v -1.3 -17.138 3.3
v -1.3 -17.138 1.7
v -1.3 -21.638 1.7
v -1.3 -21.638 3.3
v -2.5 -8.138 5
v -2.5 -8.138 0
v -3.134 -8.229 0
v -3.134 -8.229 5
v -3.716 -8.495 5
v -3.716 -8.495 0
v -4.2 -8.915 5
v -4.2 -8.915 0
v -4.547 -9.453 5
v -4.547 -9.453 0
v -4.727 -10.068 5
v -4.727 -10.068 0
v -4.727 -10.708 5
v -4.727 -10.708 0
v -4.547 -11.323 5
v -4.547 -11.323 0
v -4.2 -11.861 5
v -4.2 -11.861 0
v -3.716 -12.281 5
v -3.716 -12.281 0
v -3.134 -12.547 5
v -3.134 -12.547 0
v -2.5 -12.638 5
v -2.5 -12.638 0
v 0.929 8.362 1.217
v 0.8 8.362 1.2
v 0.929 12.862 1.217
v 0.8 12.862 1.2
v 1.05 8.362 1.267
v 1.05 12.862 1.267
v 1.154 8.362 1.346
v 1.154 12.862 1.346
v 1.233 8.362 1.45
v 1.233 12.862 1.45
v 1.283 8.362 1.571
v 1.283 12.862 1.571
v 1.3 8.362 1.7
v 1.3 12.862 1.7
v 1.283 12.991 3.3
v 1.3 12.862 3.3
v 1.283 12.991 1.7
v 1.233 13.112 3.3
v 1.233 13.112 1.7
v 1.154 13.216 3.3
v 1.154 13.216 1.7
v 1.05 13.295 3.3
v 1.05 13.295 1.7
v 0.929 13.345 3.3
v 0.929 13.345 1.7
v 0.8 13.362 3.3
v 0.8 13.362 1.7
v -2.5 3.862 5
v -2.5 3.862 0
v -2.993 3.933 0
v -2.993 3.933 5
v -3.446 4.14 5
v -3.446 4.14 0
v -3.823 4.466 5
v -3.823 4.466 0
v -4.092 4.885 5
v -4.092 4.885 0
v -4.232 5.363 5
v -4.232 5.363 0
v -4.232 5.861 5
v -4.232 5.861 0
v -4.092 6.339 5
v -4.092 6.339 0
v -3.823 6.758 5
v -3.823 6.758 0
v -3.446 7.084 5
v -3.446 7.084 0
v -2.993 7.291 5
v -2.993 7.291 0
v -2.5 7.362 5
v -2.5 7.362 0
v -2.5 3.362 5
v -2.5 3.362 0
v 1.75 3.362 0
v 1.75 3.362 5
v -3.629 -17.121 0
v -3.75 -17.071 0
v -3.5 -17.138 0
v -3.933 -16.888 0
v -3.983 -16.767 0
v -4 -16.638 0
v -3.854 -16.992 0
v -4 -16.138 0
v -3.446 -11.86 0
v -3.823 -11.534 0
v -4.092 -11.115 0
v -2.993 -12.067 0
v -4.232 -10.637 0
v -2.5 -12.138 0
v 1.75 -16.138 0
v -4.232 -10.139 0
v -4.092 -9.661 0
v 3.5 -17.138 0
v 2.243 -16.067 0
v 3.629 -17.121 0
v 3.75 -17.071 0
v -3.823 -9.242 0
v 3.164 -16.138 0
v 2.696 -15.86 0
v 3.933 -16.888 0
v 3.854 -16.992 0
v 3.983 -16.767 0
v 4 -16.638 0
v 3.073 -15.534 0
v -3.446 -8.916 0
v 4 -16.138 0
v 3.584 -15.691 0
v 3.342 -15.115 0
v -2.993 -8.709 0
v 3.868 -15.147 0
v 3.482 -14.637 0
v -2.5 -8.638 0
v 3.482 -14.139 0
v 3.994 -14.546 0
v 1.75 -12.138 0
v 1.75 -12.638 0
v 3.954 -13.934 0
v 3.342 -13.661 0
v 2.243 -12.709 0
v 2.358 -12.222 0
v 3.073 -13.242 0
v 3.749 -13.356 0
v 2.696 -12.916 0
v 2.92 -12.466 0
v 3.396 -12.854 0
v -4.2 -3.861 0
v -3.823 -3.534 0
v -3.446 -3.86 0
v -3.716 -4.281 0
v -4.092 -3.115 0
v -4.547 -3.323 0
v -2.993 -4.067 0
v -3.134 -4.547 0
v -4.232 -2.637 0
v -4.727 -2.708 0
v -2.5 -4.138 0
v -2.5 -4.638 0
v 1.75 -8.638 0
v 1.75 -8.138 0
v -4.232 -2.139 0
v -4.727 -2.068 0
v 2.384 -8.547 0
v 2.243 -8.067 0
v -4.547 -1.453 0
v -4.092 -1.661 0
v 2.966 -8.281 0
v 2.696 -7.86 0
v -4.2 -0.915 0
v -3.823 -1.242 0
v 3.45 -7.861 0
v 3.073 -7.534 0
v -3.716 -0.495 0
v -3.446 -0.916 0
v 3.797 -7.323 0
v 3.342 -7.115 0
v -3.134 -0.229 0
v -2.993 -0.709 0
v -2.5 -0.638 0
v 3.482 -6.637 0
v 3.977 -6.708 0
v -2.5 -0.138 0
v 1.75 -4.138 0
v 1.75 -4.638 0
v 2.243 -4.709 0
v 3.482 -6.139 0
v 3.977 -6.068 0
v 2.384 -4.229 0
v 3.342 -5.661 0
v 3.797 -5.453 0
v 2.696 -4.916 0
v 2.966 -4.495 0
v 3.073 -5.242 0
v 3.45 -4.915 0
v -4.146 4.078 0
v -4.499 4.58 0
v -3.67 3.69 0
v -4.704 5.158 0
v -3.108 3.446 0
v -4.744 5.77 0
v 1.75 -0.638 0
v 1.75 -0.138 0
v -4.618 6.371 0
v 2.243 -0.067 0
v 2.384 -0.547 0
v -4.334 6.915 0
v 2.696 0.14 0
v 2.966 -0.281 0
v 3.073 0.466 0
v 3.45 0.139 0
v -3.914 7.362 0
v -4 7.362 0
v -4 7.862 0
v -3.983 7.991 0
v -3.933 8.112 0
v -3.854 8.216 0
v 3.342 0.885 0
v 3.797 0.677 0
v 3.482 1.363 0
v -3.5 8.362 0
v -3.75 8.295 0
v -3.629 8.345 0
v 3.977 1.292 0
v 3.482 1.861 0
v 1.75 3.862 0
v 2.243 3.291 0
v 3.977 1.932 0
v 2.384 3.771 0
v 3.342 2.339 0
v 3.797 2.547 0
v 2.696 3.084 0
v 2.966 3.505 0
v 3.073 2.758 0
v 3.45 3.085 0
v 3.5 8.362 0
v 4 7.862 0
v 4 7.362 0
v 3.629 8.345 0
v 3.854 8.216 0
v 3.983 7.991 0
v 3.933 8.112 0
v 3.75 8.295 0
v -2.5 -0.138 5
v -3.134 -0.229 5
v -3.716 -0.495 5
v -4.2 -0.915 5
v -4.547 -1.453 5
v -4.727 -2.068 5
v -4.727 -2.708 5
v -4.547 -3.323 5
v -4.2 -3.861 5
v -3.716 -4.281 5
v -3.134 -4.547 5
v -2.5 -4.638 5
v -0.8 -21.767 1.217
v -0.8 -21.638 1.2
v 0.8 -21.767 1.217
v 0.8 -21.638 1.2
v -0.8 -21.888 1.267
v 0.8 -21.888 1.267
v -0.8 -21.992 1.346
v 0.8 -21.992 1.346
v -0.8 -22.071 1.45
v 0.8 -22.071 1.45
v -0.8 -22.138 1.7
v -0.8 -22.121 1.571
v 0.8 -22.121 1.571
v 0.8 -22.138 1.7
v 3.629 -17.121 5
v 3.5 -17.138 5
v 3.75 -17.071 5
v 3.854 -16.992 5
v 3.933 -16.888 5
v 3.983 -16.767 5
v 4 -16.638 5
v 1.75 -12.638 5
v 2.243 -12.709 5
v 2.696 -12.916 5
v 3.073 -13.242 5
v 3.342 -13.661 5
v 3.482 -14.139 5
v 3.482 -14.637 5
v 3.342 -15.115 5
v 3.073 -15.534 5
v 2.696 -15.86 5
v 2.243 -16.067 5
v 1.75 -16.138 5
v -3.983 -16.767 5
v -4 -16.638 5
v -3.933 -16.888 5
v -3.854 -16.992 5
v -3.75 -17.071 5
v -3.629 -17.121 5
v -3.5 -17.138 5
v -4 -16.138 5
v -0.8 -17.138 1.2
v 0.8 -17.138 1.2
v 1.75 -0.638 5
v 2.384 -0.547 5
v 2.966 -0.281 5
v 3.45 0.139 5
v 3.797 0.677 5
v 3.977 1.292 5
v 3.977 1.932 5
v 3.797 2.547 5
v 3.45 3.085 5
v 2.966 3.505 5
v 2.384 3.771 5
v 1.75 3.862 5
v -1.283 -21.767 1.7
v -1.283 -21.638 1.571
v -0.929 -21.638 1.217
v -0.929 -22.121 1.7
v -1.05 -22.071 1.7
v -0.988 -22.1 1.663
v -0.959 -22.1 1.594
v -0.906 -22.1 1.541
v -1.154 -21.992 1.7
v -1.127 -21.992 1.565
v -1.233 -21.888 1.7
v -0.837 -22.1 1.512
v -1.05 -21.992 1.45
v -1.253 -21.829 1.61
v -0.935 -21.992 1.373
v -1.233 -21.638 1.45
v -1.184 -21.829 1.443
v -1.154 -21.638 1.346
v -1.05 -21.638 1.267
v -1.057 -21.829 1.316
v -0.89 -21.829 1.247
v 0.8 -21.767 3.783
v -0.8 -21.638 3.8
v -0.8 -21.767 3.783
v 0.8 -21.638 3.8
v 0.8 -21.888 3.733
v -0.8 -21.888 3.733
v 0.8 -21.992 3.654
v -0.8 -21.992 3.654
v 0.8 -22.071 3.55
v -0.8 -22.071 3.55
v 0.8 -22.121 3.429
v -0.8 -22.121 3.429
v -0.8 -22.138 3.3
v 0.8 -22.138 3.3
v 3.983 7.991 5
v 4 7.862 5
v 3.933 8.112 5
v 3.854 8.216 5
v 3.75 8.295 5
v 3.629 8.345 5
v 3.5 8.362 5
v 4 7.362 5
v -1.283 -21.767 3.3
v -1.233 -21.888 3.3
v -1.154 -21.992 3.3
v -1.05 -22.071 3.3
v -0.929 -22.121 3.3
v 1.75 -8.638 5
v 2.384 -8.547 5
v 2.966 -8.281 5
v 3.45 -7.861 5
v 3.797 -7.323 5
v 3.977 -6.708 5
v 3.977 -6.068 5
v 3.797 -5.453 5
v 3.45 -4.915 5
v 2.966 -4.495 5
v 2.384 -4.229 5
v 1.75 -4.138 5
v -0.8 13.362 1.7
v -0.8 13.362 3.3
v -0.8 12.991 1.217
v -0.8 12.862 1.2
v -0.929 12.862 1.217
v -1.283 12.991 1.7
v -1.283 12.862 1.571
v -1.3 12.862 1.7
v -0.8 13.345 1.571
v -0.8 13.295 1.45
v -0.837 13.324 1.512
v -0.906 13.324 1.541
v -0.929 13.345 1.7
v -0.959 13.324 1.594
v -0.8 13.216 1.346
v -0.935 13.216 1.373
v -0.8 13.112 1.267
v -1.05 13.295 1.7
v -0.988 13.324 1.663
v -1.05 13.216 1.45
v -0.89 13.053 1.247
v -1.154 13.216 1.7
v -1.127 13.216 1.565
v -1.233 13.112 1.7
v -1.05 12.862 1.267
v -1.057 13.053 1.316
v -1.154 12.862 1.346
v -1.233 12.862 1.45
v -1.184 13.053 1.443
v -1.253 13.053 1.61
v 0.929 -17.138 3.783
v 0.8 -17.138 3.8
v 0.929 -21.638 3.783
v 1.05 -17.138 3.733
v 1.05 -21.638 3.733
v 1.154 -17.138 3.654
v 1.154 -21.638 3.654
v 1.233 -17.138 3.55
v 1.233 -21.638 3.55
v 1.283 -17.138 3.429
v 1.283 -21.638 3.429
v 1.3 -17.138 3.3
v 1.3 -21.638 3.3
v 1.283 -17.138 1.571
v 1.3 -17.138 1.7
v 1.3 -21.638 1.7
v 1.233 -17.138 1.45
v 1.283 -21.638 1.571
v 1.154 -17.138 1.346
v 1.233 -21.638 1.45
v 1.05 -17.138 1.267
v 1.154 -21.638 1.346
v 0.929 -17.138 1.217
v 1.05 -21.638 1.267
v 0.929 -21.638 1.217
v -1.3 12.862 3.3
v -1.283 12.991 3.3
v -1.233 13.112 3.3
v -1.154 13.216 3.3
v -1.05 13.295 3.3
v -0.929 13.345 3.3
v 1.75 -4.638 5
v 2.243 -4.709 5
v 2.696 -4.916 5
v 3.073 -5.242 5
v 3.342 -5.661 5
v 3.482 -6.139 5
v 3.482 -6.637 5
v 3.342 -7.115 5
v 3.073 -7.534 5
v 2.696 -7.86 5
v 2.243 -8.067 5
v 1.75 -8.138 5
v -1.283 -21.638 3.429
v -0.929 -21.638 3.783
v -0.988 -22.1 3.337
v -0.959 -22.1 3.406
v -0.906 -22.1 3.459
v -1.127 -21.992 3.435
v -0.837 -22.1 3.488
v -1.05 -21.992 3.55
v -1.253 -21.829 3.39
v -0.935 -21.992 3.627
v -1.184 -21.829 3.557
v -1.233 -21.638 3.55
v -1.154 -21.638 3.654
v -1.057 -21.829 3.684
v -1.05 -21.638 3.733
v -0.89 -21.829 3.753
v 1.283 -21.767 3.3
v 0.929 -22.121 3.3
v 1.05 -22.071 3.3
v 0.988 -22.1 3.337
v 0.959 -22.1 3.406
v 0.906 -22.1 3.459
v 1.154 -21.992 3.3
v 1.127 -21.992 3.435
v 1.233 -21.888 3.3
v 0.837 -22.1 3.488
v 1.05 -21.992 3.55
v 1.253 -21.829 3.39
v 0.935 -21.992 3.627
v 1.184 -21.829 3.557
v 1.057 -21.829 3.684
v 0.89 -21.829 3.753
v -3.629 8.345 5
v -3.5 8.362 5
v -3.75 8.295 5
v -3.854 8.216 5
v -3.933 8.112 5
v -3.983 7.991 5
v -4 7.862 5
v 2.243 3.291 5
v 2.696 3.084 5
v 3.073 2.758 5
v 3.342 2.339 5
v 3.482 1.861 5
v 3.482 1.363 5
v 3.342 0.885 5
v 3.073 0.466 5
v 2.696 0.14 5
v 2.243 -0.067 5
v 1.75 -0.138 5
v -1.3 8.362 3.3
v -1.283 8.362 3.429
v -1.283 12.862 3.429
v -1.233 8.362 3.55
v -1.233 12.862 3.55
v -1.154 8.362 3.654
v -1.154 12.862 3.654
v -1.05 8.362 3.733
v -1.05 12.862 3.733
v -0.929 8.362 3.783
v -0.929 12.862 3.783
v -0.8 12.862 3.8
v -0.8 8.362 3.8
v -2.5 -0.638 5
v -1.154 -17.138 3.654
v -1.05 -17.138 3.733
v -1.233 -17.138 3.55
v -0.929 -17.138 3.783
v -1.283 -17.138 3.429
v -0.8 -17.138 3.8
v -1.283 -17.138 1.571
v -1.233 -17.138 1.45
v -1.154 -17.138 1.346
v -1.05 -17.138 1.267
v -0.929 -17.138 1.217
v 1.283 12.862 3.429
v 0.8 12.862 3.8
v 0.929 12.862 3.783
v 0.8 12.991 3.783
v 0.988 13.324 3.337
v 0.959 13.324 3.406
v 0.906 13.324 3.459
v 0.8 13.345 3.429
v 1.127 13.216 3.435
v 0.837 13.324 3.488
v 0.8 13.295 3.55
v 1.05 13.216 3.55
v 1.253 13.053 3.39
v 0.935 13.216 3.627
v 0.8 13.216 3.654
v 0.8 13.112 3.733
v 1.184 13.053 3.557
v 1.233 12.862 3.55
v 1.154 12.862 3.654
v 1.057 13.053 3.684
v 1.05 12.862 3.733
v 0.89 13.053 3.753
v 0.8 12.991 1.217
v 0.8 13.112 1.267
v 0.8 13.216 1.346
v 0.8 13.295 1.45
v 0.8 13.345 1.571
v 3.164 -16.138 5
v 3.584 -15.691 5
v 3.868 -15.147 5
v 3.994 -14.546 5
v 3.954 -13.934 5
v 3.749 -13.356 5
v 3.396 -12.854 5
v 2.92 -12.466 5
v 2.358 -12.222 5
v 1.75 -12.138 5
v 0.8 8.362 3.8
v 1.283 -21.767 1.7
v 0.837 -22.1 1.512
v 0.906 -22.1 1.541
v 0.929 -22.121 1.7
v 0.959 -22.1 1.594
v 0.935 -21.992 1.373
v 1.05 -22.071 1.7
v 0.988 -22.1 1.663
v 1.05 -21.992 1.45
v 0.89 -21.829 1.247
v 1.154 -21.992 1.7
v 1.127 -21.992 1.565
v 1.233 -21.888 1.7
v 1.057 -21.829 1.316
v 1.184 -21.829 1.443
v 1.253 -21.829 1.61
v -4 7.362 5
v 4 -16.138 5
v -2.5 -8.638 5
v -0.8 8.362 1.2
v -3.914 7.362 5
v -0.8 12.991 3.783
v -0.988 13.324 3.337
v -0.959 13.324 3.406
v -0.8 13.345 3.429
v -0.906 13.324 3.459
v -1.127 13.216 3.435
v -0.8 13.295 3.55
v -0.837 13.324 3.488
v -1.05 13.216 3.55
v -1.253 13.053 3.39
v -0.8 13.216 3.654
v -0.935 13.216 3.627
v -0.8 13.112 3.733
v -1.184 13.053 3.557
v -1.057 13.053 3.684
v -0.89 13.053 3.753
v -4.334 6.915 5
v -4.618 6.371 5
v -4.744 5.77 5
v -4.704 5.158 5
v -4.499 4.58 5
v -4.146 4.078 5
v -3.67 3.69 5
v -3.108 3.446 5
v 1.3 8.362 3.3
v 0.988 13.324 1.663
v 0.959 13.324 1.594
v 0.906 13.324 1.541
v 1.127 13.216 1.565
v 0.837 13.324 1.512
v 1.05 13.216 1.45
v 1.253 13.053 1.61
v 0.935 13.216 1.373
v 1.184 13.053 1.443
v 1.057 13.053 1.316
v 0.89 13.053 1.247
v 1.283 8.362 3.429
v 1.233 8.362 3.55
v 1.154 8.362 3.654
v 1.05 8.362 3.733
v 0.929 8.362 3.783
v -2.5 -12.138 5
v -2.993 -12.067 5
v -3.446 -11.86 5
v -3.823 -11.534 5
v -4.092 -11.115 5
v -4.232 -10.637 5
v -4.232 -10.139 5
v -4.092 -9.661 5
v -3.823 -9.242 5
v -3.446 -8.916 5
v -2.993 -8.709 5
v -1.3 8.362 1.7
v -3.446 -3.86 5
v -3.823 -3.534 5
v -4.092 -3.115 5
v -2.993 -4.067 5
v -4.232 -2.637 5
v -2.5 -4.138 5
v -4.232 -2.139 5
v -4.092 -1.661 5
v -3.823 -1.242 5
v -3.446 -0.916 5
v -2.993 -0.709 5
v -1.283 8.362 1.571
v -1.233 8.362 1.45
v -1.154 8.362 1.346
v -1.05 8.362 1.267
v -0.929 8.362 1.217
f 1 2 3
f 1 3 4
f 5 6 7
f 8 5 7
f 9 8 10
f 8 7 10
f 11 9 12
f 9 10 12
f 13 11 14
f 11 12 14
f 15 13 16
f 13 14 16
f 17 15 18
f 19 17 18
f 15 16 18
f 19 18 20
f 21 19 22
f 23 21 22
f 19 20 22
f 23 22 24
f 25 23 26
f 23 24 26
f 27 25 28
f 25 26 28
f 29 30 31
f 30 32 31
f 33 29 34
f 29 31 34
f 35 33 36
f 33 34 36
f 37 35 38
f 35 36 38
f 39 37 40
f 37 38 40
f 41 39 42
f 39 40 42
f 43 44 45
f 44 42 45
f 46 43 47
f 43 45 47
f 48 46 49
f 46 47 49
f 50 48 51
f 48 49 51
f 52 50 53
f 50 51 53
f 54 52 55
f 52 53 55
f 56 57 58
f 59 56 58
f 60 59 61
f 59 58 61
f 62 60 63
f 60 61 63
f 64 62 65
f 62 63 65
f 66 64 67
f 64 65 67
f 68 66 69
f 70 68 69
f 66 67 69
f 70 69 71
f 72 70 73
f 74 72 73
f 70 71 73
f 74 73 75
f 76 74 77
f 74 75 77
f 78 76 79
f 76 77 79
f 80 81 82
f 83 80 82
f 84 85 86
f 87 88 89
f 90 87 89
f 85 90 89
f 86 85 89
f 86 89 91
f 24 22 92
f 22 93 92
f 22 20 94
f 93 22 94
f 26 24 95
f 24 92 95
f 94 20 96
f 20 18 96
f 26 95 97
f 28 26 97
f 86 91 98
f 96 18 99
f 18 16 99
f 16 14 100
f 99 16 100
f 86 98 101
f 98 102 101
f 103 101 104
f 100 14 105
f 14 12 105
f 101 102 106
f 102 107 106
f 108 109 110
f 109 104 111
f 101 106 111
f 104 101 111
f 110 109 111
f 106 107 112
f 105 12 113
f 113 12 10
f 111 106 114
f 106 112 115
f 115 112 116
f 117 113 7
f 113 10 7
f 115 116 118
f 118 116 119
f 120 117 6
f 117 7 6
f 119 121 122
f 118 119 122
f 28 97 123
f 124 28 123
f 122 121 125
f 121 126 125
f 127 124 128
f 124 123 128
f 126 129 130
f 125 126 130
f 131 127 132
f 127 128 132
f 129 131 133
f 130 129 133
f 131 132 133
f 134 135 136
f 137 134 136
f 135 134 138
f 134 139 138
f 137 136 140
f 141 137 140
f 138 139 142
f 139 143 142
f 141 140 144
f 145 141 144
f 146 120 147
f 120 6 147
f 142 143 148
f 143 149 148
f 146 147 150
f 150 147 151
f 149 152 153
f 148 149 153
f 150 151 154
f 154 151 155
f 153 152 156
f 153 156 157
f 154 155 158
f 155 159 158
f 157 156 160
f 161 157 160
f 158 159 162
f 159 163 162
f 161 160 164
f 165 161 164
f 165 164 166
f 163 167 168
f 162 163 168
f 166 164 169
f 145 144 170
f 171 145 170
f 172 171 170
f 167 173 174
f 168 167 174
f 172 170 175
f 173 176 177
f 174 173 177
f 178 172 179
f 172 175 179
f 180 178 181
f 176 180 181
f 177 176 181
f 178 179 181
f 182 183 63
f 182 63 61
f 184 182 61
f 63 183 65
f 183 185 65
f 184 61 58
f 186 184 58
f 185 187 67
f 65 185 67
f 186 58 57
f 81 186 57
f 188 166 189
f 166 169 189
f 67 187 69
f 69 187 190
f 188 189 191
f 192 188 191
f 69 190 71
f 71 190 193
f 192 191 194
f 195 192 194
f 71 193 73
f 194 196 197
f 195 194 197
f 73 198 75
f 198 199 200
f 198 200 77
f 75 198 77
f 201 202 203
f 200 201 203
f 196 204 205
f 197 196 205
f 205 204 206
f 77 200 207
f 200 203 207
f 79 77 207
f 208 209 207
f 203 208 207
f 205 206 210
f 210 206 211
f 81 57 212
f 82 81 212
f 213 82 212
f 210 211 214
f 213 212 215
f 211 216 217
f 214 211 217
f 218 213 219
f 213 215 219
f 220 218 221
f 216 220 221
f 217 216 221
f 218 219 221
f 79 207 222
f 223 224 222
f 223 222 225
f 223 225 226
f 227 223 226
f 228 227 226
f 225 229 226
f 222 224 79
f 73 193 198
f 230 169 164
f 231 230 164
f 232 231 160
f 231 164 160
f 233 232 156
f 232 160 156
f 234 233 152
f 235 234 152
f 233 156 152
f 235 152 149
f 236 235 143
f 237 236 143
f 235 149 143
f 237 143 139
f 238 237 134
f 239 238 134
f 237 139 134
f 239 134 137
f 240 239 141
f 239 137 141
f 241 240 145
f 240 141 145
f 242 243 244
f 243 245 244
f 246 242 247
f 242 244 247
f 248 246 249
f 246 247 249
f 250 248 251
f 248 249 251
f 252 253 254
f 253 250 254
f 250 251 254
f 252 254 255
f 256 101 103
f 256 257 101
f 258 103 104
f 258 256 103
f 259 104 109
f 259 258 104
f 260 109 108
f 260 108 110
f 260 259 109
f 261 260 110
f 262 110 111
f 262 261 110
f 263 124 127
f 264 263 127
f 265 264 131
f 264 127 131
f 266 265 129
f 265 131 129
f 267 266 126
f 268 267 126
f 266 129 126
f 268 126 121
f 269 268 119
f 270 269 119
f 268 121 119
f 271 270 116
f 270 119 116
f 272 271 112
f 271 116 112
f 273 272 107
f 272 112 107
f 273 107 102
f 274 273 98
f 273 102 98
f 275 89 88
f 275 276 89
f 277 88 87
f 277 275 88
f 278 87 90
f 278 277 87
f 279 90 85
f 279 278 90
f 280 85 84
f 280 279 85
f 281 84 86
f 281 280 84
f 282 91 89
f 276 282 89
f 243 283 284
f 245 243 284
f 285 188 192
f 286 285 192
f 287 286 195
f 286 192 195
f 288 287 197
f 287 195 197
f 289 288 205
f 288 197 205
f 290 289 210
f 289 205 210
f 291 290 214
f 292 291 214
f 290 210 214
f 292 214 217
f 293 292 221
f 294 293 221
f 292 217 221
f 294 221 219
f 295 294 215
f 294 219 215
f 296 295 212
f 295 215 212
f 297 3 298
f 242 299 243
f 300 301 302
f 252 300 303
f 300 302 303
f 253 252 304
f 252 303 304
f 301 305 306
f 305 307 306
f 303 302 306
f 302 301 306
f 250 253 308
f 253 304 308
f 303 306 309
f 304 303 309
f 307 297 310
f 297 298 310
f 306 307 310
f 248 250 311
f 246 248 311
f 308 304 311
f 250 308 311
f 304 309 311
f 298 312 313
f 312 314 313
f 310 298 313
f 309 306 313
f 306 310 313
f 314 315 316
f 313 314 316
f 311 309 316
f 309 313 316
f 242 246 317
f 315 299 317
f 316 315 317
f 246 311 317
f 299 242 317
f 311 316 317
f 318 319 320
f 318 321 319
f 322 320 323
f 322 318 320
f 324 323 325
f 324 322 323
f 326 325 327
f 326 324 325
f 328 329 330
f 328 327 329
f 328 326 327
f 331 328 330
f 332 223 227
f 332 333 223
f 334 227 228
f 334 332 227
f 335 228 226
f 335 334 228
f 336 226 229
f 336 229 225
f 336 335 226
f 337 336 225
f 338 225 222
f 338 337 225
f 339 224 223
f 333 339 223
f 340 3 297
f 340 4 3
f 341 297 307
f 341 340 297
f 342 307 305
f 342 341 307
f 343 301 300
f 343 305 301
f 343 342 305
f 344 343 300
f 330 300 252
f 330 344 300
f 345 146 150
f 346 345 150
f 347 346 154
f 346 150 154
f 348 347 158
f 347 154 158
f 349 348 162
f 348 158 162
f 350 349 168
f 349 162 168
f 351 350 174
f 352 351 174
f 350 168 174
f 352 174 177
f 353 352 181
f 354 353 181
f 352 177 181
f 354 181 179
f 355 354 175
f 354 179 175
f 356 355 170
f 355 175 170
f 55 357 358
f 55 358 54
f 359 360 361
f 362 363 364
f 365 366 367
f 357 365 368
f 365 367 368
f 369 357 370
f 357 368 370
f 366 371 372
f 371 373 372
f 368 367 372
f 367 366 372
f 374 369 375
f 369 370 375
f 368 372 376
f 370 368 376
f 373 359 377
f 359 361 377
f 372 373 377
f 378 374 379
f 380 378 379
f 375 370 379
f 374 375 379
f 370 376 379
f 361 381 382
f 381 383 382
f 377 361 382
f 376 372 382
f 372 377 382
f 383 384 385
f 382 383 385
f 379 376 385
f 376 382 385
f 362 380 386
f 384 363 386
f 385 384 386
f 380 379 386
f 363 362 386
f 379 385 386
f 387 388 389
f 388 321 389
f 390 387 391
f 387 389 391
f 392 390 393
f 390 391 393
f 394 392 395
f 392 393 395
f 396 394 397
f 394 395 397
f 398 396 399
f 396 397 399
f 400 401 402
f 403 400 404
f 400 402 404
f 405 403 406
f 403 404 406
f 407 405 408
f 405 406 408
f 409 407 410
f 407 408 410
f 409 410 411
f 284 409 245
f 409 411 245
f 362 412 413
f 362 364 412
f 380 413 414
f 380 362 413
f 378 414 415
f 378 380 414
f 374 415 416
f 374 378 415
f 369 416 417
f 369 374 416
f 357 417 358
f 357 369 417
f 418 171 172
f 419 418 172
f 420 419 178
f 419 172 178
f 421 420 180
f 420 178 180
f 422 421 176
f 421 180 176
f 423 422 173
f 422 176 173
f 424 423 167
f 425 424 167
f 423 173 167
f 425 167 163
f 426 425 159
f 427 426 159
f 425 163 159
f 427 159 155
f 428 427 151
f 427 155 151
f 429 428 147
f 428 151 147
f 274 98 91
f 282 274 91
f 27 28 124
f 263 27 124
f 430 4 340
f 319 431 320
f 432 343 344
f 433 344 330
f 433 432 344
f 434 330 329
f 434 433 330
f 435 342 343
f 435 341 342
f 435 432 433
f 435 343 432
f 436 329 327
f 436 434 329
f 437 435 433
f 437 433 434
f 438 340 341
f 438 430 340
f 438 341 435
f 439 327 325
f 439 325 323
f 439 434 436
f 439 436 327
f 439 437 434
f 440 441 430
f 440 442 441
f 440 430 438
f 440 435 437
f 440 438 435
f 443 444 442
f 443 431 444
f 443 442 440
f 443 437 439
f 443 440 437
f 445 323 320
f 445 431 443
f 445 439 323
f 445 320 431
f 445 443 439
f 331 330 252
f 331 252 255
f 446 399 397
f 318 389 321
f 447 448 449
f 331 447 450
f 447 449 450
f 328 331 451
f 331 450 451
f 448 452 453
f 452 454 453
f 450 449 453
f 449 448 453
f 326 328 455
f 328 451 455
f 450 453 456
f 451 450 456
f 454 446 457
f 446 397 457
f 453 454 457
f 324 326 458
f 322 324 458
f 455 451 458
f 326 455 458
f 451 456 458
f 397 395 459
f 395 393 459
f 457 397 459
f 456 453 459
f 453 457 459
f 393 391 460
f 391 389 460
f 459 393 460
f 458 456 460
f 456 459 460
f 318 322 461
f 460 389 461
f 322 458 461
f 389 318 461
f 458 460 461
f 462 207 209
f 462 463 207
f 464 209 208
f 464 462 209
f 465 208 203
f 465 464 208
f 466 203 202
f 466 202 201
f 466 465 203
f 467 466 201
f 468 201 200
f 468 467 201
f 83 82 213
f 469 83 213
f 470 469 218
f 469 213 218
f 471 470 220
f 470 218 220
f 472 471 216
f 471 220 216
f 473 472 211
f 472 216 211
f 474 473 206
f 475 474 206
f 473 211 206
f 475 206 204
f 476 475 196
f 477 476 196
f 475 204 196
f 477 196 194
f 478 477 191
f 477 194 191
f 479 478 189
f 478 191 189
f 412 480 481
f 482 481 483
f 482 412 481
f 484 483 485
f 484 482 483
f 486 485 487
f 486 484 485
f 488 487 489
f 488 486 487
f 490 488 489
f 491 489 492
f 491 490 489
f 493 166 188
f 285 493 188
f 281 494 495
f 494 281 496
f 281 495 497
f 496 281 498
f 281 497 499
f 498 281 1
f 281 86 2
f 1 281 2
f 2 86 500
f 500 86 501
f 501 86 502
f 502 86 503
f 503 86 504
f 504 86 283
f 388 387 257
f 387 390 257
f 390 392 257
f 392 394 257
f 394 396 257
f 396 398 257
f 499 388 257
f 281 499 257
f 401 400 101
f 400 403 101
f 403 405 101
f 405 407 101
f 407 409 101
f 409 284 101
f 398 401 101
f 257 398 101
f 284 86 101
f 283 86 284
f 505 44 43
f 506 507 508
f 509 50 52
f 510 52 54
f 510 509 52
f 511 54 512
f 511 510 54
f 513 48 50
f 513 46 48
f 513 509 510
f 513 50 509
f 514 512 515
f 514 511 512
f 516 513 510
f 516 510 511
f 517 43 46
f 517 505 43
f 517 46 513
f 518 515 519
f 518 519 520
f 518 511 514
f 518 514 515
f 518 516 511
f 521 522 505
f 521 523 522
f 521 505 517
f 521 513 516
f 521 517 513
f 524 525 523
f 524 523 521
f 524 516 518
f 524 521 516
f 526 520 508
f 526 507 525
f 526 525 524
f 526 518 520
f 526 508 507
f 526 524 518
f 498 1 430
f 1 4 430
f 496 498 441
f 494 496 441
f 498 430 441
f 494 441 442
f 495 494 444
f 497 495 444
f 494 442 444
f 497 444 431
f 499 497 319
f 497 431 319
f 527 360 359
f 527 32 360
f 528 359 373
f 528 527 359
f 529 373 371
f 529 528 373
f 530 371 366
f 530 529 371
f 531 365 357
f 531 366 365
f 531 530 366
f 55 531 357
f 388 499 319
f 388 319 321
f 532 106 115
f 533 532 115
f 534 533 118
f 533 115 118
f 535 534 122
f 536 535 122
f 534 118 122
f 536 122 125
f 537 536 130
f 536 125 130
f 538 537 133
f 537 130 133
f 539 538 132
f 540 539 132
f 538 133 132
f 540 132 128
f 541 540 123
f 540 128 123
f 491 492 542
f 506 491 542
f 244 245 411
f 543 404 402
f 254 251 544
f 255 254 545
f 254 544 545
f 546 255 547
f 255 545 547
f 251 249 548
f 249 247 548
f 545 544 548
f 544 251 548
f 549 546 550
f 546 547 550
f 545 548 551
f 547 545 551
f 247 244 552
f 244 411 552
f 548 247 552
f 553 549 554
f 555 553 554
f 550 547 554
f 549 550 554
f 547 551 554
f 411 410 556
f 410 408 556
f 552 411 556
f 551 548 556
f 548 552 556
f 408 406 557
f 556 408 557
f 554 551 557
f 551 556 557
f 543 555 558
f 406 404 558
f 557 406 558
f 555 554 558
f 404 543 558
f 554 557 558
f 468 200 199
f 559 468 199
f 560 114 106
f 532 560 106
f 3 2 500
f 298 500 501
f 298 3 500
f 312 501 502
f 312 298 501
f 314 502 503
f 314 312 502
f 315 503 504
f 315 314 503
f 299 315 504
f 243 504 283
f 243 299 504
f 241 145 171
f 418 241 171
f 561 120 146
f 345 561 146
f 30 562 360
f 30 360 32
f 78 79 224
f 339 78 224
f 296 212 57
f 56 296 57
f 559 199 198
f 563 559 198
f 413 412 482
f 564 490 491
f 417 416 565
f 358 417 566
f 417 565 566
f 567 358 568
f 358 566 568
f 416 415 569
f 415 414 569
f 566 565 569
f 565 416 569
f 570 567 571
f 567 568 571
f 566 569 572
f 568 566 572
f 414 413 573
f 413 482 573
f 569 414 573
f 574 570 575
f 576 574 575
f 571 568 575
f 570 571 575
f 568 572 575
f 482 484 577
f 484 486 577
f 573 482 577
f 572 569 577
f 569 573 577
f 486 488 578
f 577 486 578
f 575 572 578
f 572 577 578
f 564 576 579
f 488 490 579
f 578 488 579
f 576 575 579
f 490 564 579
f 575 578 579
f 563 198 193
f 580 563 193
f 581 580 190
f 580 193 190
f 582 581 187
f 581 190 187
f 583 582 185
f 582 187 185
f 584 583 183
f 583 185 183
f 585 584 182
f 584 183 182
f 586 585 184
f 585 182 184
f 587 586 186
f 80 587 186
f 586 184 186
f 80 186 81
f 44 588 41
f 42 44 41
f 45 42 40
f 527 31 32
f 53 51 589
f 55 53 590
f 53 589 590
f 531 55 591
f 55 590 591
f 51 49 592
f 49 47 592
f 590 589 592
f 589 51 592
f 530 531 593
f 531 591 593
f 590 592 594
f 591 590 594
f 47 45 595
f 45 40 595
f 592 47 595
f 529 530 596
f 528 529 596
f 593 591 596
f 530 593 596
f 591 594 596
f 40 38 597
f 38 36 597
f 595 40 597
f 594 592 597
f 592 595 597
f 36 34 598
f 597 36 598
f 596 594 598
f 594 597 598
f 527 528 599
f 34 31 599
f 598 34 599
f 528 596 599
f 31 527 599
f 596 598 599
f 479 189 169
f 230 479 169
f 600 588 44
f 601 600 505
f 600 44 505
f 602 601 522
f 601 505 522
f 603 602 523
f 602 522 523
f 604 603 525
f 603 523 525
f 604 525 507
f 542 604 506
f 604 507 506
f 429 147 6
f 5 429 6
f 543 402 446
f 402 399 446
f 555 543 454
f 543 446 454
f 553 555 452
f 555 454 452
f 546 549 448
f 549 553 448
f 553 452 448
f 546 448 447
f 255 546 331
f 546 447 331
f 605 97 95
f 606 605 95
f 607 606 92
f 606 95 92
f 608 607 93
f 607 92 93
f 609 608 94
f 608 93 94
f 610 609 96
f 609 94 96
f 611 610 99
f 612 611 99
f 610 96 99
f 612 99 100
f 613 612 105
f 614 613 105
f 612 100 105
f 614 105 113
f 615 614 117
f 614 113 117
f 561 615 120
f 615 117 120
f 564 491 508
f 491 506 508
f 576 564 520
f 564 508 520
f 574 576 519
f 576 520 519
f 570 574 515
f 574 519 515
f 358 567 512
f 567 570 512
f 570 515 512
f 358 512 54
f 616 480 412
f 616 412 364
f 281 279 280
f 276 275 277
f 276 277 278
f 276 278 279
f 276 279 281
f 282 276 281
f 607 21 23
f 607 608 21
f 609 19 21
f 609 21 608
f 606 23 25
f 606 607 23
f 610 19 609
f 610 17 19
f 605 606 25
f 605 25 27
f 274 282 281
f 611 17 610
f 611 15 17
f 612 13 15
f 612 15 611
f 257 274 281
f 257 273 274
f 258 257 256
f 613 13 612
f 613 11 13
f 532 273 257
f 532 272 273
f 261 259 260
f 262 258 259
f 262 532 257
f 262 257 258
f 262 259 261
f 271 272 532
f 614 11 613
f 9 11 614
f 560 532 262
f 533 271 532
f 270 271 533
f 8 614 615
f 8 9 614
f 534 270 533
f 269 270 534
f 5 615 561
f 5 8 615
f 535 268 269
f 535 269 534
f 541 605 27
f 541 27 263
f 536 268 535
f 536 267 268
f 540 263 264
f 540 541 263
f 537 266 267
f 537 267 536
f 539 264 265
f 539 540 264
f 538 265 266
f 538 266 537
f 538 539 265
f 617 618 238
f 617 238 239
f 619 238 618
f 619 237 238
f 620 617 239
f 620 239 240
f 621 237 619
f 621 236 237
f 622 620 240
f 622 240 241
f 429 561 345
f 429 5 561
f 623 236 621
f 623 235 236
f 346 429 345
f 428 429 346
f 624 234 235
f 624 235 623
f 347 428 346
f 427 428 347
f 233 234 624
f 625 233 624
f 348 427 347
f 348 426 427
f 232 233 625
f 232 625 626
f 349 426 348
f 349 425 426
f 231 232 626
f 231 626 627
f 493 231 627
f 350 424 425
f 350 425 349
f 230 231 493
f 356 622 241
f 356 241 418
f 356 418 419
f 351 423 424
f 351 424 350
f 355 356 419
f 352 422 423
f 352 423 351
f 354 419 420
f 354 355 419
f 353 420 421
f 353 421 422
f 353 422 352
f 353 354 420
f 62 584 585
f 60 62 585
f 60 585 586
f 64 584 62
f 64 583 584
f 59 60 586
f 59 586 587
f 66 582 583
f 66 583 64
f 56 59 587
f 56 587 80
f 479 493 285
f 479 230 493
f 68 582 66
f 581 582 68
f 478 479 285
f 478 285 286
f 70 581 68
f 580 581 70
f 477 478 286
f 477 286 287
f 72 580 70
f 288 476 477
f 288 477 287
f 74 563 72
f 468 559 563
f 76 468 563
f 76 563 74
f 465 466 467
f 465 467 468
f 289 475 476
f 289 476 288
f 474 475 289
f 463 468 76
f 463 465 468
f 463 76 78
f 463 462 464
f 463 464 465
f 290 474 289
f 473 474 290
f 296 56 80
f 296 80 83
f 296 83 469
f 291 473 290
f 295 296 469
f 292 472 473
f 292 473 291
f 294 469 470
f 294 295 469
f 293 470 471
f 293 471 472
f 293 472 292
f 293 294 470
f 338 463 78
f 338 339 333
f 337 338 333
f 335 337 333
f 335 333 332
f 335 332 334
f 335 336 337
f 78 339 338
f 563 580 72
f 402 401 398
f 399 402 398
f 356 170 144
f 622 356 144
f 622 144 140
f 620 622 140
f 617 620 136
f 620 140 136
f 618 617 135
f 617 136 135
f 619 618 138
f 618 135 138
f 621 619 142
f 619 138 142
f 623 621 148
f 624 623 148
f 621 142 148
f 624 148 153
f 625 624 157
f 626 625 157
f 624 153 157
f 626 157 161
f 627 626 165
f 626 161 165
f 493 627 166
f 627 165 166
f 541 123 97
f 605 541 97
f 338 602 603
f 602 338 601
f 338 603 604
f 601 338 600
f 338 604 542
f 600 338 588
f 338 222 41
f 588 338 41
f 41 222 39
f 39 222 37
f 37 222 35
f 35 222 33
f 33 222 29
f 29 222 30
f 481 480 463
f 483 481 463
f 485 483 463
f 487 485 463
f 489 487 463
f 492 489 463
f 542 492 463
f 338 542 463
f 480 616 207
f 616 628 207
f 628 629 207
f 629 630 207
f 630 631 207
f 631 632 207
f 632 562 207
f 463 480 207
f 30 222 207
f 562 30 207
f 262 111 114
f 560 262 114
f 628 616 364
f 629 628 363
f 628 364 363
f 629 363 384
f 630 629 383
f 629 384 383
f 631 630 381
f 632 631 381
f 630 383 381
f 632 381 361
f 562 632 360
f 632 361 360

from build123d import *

# Parameters (mm, degrees)
BOSS_EXTRUDE1_DEPTH = 5
SKETCH3_W           = 2.6
SKETCH3_H           = 2.6
BOSS_EXTRUDE2_DEPTH = 5
SKETCH4_W           = 2.6
SKETCH4_H           = 2.6
BOSS_EXTRUDE3_DEPTH = 5
FILLET1_R           = 0.5


with BuildPart() as part:
    # Sketch2 → Boss-Extrude1 (new body)
    with BuildSketch(Plane.XY):
        with BuildLine():
            Line((1.75, -16.137999311), (-4, -16.137999311))
            Line((-4, -16.137999311), (-4, -17.137999311))
            Line((-4, -17.137999311), (4, -17.137999311))
            Line((4, -17.137999311), (4, -16.137999311))
            Line((4, -16.137999311), (3.164213562, -16.137999311))
            ThreePointArc((3.164213562, -16.137999311), (3.871320344, -13.637999311), (1.75, -12.137999311))
            Line((1.75, -12.137999311), (-2.5, -12.137999311))
            ThreePointArc((-2.5, -12.137999311), (-4.25, -10.387999311), (-2.5, -8.637999311))
            Line((-2.5, -8.637999311), (1.75, -8.637999311))
            ThreePointArc((1.75, -8.637999311), (4, -6.387999311), (1.75, -4.137999311))
            Line((1.75, -4.137999311), (-2.5, -4.137999311))
            ThreePointArc((-2.5, -4.137999311), (-4.25, -2.387999311), (-2.5, -0.637999311))
            Line((-2.5, -0.637999311), (1.75, -0.637999311))
            ThreePointArc((1.75, -0.637999311), (4, 1.612000689), (1.75, 3.862000689))
            Line((1.75, 3.862000689), (-2.5, 3.862000689))
            ThreePointArc((-2.5, 3.862000689), (-4.25, 5.612000689), (-2.5, 7.362000689))
            Line((-2.5, 7.362000689), (4, 7.362000689))
            Line((4, 7.362000689), (4, 8.362000689))
            Line((4, 8.362000689), (-4, 8.362000689))
            Line((-4, 8.362000689), (-4, 7.362000689))
            Line((-4, 7.362000689), (-3.914213562, 7.362000689))
            ThreePointArc((-3.914213562, 7.362000689), (-4.621320344, 4.862000689), (-2.5, 3.362000689))
            Line((-2.5, 3.362000689), (1.75, 3.362000689))
            ThreePointArc((1.75, 3.362000689), (3.5, 1.612000689), (1.75, -0.137999311))
            Line((1.75, -0.137999311), (-2.5, -0.137999311))
            ThreePointArc((-2.5, -0.137999311), (-4.75, -2.387999311), (-2.5, -4.637999311))
            Line((-2.5, -4.637999311), (1.75, -4.637999311))
            ThreePointArc((1.75, -4.637999311), (3.5, -6.387999311), (1.75, -8.137999311))
            Line((1.75, -8.137999311), (-2.5, -8.137999311))
            ThreePointArc((-2.5, -8.137999311), (-4.75, -10.387999311), (-2.5, -12.637999311))
            Line((-2.5, -12.637999311), (1.75, -12.637999311))
            ThreePointArc((1.75, -12.637999311), (3.5, -14.387999311), (1.75, -16.137999311))
        make_face()
    extrude(amount=BOSS_EXTRUDE1_DEPTH)

    # Sketch3 → Boss-Extrude2 (add)
    with BuildSketch(Plane(origin=(0, 8.362000689, 0), x_dir=(1, 0, 0), z_dir=(0, 1, 0))):
        with Locations((0, -2.5)):
            Rectangle(SKETCH3_W, SKETCH3_H)
    extrude(amount=BOSS_EXTRUDE2_DEPTH)

    # Sketch4 → Boss-Extrude3 (add)
    with BuildSketch(Plane.XZ.offset(17.137999311)):
        with Locations((0, 2.5)):
            Rectangle(SKETCH4_W, SKETCH4_H)
    extrude(amount=BOSS_EXTRUDE3_DEPTH)

    # Fillet1
    fillet1_edges = [part.edges().sort_by_distance(p)[0] for p in [
        (1.3, 10.862000689, 3.8),
        (1.3, 10.862000689, 1.2),
        (-1.3, 10.862000689, 1.2),
        (-1.3, 10.862000689, 3.8),
        (1.3, 13.362000689, 2.5),
        (0, 13.362000689, 1.2),
        (-1.3, 13.362000689, 2.5),
        (0, 13.362000689, 3.8),
        (-1.3, -19.637999311, 3.8),
        (-1.3, -19.637999311, 1.2),
        (1.3, -19.637999311, 1.2),
        (1.3, -19.637999311, 3.8),
        (-1.3, -22.137999311, 2.5),
        (0, -22.137999311, 1.2),
        (1.3, -22.137999311, 2.5),
        (0, -22.137999311, 3.8),
        (-4, 8.362000689, 2.5),
        (4, 8.362000689, 2.5),
        (4, -17.137999311, 2.5),
        (-4, -17.137999311, 2.5),
    ]]
    fillet(fillet1_edges, radius=FILLET1_R)


solid = part.part
